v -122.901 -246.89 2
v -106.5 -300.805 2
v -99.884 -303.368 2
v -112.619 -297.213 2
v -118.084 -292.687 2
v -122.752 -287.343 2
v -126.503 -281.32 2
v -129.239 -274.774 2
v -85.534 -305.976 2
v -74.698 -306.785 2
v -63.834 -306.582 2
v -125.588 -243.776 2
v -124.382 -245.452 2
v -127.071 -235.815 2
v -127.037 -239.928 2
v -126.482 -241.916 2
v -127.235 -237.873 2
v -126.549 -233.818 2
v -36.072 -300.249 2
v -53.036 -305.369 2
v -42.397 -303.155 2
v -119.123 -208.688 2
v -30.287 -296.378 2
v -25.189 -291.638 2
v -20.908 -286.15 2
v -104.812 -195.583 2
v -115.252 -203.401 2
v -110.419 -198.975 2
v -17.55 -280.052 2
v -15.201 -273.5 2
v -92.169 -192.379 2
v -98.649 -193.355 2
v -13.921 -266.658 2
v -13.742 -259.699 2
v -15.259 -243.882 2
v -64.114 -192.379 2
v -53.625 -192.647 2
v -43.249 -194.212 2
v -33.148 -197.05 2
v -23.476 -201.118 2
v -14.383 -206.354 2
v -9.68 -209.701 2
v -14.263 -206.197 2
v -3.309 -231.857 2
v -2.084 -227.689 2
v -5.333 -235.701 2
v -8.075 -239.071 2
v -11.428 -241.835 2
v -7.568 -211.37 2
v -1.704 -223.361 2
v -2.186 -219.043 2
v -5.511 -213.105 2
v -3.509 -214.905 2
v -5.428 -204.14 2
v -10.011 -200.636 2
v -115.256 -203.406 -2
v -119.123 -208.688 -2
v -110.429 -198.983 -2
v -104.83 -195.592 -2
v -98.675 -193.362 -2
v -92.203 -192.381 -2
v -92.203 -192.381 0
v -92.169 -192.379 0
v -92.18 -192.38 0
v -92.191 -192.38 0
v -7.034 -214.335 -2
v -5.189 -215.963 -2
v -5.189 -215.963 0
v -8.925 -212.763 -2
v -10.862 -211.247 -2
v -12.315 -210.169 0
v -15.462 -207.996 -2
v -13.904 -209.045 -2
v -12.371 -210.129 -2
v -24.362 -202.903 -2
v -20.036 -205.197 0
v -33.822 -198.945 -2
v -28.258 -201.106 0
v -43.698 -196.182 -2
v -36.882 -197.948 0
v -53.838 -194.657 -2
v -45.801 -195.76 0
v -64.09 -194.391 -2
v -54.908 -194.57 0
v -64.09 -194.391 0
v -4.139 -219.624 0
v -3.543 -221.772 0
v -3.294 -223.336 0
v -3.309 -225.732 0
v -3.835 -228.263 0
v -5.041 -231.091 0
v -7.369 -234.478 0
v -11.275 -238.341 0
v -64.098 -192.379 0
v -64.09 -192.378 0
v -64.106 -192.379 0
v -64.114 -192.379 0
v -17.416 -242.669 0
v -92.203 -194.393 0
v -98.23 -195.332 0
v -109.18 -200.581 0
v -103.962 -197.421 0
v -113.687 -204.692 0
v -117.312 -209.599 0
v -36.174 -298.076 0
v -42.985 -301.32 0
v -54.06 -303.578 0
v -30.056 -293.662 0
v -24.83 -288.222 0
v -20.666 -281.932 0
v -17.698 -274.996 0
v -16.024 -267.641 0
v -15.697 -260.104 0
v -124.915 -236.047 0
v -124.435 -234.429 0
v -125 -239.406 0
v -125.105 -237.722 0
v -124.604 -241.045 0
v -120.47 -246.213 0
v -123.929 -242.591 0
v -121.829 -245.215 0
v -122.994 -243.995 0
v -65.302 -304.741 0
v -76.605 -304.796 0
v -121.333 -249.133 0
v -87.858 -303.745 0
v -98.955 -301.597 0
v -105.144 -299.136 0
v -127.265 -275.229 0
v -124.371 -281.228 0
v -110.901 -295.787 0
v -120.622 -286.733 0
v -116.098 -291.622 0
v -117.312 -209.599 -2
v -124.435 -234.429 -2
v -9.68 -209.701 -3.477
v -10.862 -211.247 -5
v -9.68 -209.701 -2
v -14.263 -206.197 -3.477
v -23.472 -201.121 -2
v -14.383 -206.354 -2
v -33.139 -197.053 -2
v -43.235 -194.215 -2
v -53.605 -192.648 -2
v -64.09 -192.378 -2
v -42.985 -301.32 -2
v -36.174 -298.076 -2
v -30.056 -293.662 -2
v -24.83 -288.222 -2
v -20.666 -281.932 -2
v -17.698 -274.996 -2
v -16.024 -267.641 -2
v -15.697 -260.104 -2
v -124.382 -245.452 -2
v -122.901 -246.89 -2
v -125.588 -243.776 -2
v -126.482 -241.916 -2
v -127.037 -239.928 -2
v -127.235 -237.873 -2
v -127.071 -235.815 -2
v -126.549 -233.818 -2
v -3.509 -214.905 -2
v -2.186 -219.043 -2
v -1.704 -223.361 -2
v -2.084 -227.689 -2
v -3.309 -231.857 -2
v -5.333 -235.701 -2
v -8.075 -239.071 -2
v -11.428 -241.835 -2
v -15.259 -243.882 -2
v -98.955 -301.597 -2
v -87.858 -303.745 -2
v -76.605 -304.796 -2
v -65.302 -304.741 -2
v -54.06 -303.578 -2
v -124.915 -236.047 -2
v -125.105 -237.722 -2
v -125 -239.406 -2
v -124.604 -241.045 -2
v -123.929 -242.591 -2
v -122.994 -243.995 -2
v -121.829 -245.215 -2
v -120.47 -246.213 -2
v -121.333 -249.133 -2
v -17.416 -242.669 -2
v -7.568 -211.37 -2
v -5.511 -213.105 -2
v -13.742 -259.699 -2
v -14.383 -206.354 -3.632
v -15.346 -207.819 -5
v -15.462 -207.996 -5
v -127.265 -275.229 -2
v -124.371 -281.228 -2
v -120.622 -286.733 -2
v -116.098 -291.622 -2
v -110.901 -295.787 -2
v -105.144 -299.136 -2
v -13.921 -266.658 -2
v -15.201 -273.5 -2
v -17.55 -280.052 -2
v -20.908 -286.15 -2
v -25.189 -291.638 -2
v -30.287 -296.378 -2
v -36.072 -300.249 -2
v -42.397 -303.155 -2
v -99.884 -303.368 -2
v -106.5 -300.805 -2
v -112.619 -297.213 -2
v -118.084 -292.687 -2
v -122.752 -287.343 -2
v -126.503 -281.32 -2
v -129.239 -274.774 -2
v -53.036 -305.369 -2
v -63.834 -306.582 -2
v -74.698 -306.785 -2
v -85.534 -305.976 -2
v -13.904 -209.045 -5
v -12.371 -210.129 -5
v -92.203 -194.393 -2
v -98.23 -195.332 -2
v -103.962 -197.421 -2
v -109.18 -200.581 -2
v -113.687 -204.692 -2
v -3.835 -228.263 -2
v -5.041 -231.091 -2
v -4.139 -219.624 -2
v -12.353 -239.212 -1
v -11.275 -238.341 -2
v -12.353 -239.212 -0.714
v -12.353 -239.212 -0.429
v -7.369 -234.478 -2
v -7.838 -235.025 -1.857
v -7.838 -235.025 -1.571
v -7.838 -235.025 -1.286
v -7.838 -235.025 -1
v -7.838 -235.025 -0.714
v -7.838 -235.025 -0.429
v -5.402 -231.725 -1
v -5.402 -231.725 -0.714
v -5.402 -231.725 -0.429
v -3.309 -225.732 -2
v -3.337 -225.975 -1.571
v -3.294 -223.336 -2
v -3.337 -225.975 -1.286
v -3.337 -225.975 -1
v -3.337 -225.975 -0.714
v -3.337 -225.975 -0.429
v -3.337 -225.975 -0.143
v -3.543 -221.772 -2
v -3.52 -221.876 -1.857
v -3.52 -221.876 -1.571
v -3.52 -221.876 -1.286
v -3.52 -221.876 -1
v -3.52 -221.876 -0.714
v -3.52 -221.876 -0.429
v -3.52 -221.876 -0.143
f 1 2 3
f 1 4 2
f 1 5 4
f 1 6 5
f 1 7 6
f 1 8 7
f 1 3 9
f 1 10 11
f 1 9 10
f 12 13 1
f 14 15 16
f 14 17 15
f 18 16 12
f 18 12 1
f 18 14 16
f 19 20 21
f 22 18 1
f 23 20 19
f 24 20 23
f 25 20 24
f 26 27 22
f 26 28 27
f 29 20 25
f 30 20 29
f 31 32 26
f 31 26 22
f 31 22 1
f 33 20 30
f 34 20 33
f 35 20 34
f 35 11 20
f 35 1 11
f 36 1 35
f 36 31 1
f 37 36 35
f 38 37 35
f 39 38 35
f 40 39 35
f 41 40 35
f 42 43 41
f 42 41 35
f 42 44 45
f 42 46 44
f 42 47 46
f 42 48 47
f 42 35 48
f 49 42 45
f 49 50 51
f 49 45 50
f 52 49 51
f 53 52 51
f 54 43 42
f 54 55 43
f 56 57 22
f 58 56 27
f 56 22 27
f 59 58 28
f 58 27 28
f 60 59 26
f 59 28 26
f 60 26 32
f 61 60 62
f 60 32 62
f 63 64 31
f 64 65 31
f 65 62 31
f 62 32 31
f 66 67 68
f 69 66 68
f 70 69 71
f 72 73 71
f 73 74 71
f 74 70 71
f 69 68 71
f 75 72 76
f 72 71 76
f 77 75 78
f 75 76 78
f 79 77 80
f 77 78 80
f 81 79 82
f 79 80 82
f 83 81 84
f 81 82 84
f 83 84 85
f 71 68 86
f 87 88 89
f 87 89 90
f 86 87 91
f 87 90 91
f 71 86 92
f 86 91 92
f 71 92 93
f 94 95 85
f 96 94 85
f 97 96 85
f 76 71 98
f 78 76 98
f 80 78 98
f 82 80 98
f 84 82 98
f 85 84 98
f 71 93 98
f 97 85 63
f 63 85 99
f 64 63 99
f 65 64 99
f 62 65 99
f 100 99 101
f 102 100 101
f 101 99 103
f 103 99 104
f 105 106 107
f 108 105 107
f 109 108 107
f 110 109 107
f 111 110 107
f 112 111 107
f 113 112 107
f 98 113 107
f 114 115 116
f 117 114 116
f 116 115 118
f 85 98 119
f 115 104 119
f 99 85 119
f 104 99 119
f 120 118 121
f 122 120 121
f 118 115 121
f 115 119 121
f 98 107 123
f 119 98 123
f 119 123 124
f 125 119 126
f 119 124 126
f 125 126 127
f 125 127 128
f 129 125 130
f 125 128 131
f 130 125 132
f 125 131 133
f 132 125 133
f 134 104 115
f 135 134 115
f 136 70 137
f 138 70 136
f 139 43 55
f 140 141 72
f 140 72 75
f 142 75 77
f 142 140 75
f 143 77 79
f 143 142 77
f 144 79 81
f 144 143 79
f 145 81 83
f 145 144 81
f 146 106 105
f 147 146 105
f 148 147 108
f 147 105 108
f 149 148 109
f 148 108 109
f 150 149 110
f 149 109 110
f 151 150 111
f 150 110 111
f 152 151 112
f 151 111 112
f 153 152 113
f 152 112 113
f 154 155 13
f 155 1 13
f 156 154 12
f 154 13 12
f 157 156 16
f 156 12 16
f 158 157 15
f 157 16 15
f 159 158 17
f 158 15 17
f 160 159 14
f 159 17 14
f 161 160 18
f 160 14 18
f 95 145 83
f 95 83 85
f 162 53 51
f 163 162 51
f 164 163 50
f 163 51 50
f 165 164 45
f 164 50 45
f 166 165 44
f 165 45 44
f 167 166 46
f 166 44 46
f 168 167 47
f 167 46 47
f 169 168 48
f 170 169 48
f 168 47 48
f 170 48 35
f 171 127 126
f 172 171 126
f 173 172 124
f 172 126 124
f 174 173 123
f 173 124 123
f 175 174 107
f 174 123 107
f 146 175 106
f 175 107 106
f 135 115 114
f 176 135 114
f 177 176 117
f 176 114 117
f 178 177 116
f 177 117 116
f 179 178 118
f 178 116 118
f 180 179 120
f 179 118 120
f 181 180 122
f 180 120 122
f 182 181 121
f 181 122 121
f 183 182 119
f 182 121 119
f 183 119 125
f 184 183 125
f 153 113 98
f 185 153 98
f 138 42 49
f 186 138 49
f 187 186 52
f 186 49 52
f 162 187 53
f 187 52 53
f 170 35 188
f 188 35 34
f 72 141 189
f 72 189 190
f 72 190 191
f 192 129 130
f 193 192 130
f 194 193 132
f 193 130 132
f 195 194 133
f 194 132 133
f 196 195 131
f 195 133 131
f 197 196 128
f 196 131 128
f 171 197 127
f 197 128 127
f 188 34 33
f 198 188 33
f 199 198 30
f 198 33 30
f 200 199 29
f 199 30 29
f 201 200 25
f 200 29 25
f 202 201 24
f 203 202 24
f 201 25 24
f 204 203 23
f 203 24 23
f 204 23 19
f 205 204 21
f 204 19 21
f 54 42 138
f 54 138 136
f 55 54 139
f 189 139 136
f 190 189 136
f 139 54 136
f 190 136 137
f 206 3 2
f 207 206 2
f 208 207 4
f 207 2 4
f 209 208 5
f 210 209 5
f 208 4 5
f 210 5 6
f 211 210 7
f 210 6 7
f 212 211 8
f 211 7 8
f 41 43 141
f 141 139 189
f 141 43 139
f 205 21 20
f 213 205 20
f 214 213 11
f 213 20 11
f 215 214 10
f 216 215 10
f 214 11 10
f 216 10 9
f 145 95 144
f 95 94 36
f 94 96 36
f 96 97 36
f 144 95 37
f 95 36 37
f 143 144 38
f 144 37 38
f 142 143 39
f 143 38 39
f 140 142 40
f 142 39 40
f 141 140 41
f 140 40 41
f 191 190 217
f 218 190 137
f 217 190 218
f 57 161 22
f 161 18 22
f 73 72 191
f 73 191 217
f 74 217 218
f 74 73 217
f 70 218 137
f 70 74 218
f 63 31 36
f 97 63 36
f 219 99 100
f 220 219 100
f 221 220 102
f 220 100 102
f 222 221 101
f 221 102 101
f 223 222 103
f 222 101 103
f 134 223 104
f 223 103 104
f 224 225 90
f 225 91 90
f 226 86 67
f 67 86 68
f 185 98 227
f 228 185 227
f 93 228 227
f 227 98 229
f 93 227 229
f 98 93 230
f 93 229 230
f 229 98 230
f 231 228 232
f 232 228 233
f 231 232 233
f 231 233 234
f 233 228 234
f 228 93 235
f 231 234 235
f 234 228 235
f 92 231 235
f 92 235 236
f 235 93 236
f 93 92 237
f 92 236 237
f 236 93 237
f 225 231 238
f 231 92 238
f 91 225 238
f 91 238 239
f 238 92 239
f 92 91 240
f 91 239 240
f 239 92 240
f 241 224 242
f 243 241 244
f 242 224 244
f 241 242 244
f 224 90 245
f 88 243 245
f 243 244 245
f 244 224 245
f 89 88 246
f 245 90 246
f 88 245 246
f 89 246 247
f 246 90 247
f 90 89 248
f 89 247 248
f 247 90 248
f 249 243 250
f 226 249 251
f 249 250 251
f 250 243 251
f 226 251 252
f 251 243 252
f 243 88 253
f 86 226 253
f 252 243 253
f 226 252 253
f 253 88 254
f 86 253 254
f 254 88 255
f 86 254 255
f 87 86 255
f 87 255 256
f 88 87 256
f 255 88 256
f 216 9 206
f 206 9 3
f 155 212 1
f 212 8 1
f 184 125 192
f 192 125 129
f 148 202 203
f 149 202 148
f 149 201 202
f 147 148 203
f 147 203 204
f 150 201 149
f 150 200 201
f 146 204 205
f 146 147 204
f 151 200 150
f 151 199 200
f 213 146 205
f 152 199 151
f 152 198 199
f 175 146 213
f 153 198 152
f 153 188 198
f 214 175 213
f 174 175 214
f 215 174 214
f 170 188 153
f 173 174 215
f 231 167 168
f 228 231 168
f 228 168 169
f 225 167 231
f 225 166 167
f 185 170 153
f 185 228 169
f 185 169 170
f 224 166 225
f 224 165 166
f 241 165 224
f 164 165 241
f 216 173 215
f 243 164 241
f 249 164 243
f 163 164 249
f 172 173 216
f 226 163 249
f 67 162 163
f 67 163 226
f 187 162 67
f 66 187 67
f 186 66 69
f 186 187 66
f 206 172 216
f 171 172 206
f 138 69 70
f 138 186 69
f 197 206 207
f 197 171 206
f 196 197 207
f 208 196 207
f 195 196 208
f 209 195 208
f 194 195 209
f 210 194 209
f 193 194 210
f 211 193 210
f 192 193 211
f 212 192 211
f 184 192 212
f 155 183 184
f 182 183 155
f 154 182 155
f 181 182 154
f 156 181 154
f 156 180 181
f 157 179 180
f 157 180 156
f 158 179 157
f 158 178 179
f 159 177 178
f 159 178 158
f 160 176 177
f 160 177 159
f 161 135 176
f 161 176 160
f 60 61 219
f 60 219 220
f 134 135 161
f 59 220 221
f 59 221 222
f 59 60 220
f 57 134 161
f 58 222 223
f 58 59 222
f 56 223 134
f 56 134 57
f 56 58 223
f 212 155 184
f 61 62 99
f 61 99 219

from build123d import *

# Parameters (mm, degrees)
BOSS_EXTRUDE1_DEPTH      = 2
BOSS_EXTRUDE1_DEPTH_BACK = 2
BOSS_EXTRUDE2_DEPTH      = 2
CUT_EXTRUDE2_DEPTH       = 3
BOSS_EXTRUDE3_DEPTH      = 3
BOSS_EXTRUDE3_DEPTH_BACK = 4
BOSS_EXTRUDE4_DEPTH      = 5.768626
BOSS_EXTRUDE5_DEPTH      = 7
CUT_EXTRUDE3_DEPTH       = 106.532768689


with BuildPart() as part:
    # Sketch1 → Boss-Extrude1 (new body, two sides)
    with BuildSketch(Plane.XY) as boss_extrude1_sk:
        with BuildLine():
            ThreePointArc((-99.883719426, -303.368163267), (-118.083910473, -292.687102225), (-129.239344224, -274.773746399))
            Line((-129.239344224, -274.773746399), (-122.900985764, -246.890150727))
            ThreePointArc((-122.900985764, -246.890150727), (-126.803064599, -240.933983923), (-126.548538034, -233.817990776))
            Line((-126.548538034, -233.817990776), (-119.123281802, -208.687862835))
            ThreePointArc((-119.123281802, -208.687862835), (-107.698999343, -197.140529866), (-92.168900704, -192.379105219))
            Line((-92.168900704, -192.379105219), (-64.113961972, -192.379105219))
            ThreePointArc((-64.113961972, -192.379105219), (-31.572672129, -197.617974675), (-3.509282377, -214.904601108))
            ThreePointArc((-3.509282377, -214.904601108), (-3.309447715, -231.856766436), (-15.259350681, -243.882391671))
            Line((-15.259350681, -243.882391671), (-13.742027997, -259.699185691))
            ThreePointArc((-13.742027997, -259.699185691), (-20.907511644, -286.149918063), (-42.397436123, -303.15487454))
            ThreePointArc((-42.397436123, -303.15487454), (-63.833611273, -306.582364975), (-85.533592749, -305.975652807))
            Line((-85.533592749, -305.975652807), (-99.883719426, -303.368163267))
        make_face()
        with BuildLine():
            add(Edge.make_bspline(
                [(-17.415513131, -242.668556981), (-16.250894512, -241.965818827), (-15.109288702, -241.224994889), (-13.441213679, -240.040387525), (-12.89262097, -239.633218083), (-11.812693685, -238.790317301), (-11.280400788, -238.353703672), (-9.726955108, -237.00465557), (-8.745390801, -236.051712079), (-7.385039015, -234.511313148), (-6.948715528, -233.976815867), (-6.130845571, -232.874503238), (-5.750270787, -232.30842269), (-4.706493232, -230.558637643), (-4.138677409, -229.324736835), (-3.562547958, -227.328857227), (-3.422001152, -226.654431705), (-3.252657323, -225.296308422), (-3.223357134, -224.611043663), (-3.269242402, -223.573082537), (-3.29957286, -223.227633129), (-3.388711058, -222.546593141), (-3.476993493, -222.041163228), (-3.596272382, -221.543472132), (-3.682574516, -221.213371534), (-3.730157677, -221.049427786), (-4.247949017, -219.244642568), (-4.718668417, -217.603928734), (-5.189387817, -215.9632149)],
                knots=[0, 0, 0, 0, 0.125, 0.125, 0.1875, 0.1875, 0.25, 0.25, 0.375, 0.375, 0.4375, 0.4375, 0.5, 0.5, 0.625, 0.625, 0.6875, 0.6875, 0.75, 0.75, 0.78125, 0.78125, 0.8125, 0.828125, 0.828125, 0.84375, 0.84375, 1, 1, 1, 1], degree=3))
            ThreePointArc((-5.189387817, -215.9632149), (-32.526455477, -199.407751302), (-64.08963442, -194.391340409))
            Line((-64.08963442, -194.391340409), (-92.144573152, -194.392657625))
            Line((-92.144573152, -194.392657625), (-92.202629041, -194.392657625))
            ThreePointArc((-92.202629041, -194.392657625), (-106.647929369, -198.873907617), (-117.312202813, -209.598718803))
            Line((-117.312202813, -209.598718803), (-124.435145464, -234.429494019))
            ThreePointArc((-124.435145464, -234.429494019), (-124.604366095, -241.045289532), (-120.469878975, -246.212823))
            Line((-120.469878975, -246.212823), (-121.332617267, -249.132685018))
            Line((-121.332617267, -249.132685018), (-127.264768762, -275.229302117))
            ThreePointArc((-127.264768762, -275.229302117), (-116.098302818, -291.621676712), (-98.954802842, -301.596661178))
            ThreePointArc((-98.954802842, -301.596661178), (-70.952790665, -304.90715996), (-42.984896901, -301.319820198))
            ThreePointArc((-42.984896901, -301.319820198), (-22.606132147, -285.170975908), (-15.696872441, -260.104237885))
            Line((-15.696872441, -260.104237885), (-17.415513131, -242.668556981))
        make_face(mode=Mode.SUBTRACT)
    extrude(amount=BOSS_EXTRUDE1_DEPTH)
    extrude(boss_extrude1_sk.sketch, amount=-BOSS_EXTRUDE1_DEPTH_BACK)

    # Sketch4 → Boss-Extrude2 (add)
    with BuildSketch(Plane.XY.offset(2)):
        with BuildLine():
            Line((-121.332617267, -249.132685018), (-127.264768762, -275.229302117))
            ThreePointArc((-127.264768762, -275.229302117), (-116.098302818, -291.621676712), (-98.954802842, -301.596661178))
            ThreePointArc((-98.954802842, -301.596661178), (-70.952790665, -304.90715996), (-42.984896901, -301.319820198))
            ThreePointArc((-42.984896901, -301.319820198), (-22.606132147, -285.170975908), (-15.696872441, -260.104237885))
            Line((-15.696872441, -260.104237885), (-17.415513131, -242.668556981))
            add(Edge.make_bspline(
                [(-17.415513131, -242.668556981), (-16.250894512, -241.965818827), (-15.109288702, -241.224994889), (-13.441213679, -240.040387525), (-12.89262097, -239.633218083), (-11.812693685, -238.790317301), (-11.280400788, -238.353703672), (-9.726955108, -237.00465557), (-8.745390801, -236.051712079), (-7.385039015, -234.511313148), (-6.948715528, -233.976815867), (-6.130845571, -232.874503238), (-5.750270787, -232.30842269), (-4.706493232, -230.558637643), (-4.138677409, -229.324736835), (-3.562547958, -227.328857227), (-3.422001152, -226.654431705), (-3.252657323, -225.296308422), (-3.223357134, -224.611043663), (-3.269242402, -223.573082537), (-3.29957286, -223.227633129), (-3.388711058, -222.546593141), (-3.476993493, -222.041163228), (-3.596272382, -221.543472132), (-3.682574516, -221.213371534), (-3.730157677, -221.049427786), (-4.247949017, -219.244642568), (-4.718668417, -217.603928734), (-5.189387817, -215.9632149)],
                knots=[0, 0, 0, 0, 0.125, 0.125, 0.1875, 0.1875, 0.25, 0.25, 0.375, 0.375, 0.4375, 0.4375, 0.5, 0.5, 0.625, 0.625, 0.6875, 0.6875, 0.75, 0.75, 0.78125, 0.78125, 0.8125, 0.828125, 0.828125, 0.84375, 0.84375, 1, 1, 1, 1], degree=3))
            ThreePointArc((-5.189387817, -215.9632149), (-32.526455477, -199.407751302), (-64.08963442, -194.391340409))
            Line((-64.08963442, -194.391340409), (-92.144573152, -194.392657625))
            Line((-92.144573152, -194.392657625), (-92.202629041, -194.392657625))
            ThreePointArc((-92.202629041, -194.392657625), (-106.647929369, -198.873907617), (-117.312202813, -209.598718803))
            Line((-117.312202813, -209.598718803), (-124.435145464, -234.429494019))
            ThreePointArc((-124.435145464, -234.429494019), (-124.604366095, -241.045289532), (-120.469878975, -246.212823))
            Line((-120.469878975, -246.212823), (-121.332617267, -249.132685018))
        make_face()
    extrude(amount=-BOSS_EXTRUDE2_DEPTH)

    # Sketch5 → Cut-Extrude2 (cut)
    with BuildSketch(Plane(origin=(0.009126788, -194.388330888, 0), x_dir=(0.999999999, 4.6951e-05, 0), z_dir=(4.6951e-05, -0.999999999, 0))):
        Polygon((-92.153700041, 0), (-92.21175593, 0), (-92.21175593, -2), (-92.153700041, -2), (-64.098761279, -2), (-64.098761279, 0), align=None)
    extrude(amount=-CUT_EXTRUDE2_DEPTH, mode=Mode.SUBTRACT)

    # Sketch6 → Boss-Extrude3 (add, two sides)
    with BuildSketch(Plane(origin=(0, 0, -2), x_dir=(-1, 0, 0), z_dir=(0, 0, -1))) as boss_extrude3_sk:
        with BuildLine():
            Line((10.862265169, -211.246797097), (9.680301702, -209.700960004))
            Line((9.680301702, -209.700960004), (14.382573251, -206.353642546))
            Line((14.382573251, -206.353642546), (15.461710653, -207.995655709))
            ThreePointArc((15.461710653, -207.995655709), (13.134440717, -209.582254915), (10.862265169, -211.246797097))
        make_face()
    extrude(amount=BOSS_EXTRUDE3_DEPTH)
    extrude(boss_extrude3_sk.sketch, amount=-BOSS_EXTRUDE3_DEPTH_BACK)



with BuildPart() as body_2:
    # Sketch7 → Boss-Extrude4 (new body)
    with BuildSketch(Plane(origin=(95.075403567, -72.695663841, 0), x_dir=(0, 0, -1), z_dir=(0.794394345, -0.607402358, 0))):
        with BuildLine():
            Line((-2, -172.465094912), (5, -172.465094912))
            ThreePointArc((5, -172.465094912), (2.949747468, -167.515347444), (-2, -165.465094912))
            Line((-2, -165.465094912), (-2, -172.465094912))
        make_face()
    extrude(amount=-BOSS_EXTRUDE4_DEPTH)


with BuildPart() as part_1:
    add(part.part)

    add(body_2.part)  # Boss-Extrude5 merges body 2
    # Sketch8 → Boss-Extrude5 (add)
    with BuildSketch(Plane(origin=(0, 0, -5), x_dir=(-1, 0, 0), z_dir=(0, 0, -1))):
        Polygon((14.26286593, -206.197082701), (14.382573251, -206.353642546), (9.680301702, -209.700960004), align=None)
    extrude(amount=-BOSS_EXTRUDE5_DEPTH)

    # Sketch9 → Cut-Extrude3 (cut, through all)
    with BuildSketch(Plane(origin=(95.075403567, -72.695663841, 0), x_dir=(0, 0, -1), z_dir=(0.794394345, -0.607402358, 0))):
        Polygon((-2, -165.465094912), (5, -174.411026553), (7.216406638, -174.411026553), (7.216406638, -165.465094912), align=None)
    extrude(amount=-CUT_EXTRUDE3_DEPTH, mode=Mode.SUBTRACT)


solid = part_1.part
